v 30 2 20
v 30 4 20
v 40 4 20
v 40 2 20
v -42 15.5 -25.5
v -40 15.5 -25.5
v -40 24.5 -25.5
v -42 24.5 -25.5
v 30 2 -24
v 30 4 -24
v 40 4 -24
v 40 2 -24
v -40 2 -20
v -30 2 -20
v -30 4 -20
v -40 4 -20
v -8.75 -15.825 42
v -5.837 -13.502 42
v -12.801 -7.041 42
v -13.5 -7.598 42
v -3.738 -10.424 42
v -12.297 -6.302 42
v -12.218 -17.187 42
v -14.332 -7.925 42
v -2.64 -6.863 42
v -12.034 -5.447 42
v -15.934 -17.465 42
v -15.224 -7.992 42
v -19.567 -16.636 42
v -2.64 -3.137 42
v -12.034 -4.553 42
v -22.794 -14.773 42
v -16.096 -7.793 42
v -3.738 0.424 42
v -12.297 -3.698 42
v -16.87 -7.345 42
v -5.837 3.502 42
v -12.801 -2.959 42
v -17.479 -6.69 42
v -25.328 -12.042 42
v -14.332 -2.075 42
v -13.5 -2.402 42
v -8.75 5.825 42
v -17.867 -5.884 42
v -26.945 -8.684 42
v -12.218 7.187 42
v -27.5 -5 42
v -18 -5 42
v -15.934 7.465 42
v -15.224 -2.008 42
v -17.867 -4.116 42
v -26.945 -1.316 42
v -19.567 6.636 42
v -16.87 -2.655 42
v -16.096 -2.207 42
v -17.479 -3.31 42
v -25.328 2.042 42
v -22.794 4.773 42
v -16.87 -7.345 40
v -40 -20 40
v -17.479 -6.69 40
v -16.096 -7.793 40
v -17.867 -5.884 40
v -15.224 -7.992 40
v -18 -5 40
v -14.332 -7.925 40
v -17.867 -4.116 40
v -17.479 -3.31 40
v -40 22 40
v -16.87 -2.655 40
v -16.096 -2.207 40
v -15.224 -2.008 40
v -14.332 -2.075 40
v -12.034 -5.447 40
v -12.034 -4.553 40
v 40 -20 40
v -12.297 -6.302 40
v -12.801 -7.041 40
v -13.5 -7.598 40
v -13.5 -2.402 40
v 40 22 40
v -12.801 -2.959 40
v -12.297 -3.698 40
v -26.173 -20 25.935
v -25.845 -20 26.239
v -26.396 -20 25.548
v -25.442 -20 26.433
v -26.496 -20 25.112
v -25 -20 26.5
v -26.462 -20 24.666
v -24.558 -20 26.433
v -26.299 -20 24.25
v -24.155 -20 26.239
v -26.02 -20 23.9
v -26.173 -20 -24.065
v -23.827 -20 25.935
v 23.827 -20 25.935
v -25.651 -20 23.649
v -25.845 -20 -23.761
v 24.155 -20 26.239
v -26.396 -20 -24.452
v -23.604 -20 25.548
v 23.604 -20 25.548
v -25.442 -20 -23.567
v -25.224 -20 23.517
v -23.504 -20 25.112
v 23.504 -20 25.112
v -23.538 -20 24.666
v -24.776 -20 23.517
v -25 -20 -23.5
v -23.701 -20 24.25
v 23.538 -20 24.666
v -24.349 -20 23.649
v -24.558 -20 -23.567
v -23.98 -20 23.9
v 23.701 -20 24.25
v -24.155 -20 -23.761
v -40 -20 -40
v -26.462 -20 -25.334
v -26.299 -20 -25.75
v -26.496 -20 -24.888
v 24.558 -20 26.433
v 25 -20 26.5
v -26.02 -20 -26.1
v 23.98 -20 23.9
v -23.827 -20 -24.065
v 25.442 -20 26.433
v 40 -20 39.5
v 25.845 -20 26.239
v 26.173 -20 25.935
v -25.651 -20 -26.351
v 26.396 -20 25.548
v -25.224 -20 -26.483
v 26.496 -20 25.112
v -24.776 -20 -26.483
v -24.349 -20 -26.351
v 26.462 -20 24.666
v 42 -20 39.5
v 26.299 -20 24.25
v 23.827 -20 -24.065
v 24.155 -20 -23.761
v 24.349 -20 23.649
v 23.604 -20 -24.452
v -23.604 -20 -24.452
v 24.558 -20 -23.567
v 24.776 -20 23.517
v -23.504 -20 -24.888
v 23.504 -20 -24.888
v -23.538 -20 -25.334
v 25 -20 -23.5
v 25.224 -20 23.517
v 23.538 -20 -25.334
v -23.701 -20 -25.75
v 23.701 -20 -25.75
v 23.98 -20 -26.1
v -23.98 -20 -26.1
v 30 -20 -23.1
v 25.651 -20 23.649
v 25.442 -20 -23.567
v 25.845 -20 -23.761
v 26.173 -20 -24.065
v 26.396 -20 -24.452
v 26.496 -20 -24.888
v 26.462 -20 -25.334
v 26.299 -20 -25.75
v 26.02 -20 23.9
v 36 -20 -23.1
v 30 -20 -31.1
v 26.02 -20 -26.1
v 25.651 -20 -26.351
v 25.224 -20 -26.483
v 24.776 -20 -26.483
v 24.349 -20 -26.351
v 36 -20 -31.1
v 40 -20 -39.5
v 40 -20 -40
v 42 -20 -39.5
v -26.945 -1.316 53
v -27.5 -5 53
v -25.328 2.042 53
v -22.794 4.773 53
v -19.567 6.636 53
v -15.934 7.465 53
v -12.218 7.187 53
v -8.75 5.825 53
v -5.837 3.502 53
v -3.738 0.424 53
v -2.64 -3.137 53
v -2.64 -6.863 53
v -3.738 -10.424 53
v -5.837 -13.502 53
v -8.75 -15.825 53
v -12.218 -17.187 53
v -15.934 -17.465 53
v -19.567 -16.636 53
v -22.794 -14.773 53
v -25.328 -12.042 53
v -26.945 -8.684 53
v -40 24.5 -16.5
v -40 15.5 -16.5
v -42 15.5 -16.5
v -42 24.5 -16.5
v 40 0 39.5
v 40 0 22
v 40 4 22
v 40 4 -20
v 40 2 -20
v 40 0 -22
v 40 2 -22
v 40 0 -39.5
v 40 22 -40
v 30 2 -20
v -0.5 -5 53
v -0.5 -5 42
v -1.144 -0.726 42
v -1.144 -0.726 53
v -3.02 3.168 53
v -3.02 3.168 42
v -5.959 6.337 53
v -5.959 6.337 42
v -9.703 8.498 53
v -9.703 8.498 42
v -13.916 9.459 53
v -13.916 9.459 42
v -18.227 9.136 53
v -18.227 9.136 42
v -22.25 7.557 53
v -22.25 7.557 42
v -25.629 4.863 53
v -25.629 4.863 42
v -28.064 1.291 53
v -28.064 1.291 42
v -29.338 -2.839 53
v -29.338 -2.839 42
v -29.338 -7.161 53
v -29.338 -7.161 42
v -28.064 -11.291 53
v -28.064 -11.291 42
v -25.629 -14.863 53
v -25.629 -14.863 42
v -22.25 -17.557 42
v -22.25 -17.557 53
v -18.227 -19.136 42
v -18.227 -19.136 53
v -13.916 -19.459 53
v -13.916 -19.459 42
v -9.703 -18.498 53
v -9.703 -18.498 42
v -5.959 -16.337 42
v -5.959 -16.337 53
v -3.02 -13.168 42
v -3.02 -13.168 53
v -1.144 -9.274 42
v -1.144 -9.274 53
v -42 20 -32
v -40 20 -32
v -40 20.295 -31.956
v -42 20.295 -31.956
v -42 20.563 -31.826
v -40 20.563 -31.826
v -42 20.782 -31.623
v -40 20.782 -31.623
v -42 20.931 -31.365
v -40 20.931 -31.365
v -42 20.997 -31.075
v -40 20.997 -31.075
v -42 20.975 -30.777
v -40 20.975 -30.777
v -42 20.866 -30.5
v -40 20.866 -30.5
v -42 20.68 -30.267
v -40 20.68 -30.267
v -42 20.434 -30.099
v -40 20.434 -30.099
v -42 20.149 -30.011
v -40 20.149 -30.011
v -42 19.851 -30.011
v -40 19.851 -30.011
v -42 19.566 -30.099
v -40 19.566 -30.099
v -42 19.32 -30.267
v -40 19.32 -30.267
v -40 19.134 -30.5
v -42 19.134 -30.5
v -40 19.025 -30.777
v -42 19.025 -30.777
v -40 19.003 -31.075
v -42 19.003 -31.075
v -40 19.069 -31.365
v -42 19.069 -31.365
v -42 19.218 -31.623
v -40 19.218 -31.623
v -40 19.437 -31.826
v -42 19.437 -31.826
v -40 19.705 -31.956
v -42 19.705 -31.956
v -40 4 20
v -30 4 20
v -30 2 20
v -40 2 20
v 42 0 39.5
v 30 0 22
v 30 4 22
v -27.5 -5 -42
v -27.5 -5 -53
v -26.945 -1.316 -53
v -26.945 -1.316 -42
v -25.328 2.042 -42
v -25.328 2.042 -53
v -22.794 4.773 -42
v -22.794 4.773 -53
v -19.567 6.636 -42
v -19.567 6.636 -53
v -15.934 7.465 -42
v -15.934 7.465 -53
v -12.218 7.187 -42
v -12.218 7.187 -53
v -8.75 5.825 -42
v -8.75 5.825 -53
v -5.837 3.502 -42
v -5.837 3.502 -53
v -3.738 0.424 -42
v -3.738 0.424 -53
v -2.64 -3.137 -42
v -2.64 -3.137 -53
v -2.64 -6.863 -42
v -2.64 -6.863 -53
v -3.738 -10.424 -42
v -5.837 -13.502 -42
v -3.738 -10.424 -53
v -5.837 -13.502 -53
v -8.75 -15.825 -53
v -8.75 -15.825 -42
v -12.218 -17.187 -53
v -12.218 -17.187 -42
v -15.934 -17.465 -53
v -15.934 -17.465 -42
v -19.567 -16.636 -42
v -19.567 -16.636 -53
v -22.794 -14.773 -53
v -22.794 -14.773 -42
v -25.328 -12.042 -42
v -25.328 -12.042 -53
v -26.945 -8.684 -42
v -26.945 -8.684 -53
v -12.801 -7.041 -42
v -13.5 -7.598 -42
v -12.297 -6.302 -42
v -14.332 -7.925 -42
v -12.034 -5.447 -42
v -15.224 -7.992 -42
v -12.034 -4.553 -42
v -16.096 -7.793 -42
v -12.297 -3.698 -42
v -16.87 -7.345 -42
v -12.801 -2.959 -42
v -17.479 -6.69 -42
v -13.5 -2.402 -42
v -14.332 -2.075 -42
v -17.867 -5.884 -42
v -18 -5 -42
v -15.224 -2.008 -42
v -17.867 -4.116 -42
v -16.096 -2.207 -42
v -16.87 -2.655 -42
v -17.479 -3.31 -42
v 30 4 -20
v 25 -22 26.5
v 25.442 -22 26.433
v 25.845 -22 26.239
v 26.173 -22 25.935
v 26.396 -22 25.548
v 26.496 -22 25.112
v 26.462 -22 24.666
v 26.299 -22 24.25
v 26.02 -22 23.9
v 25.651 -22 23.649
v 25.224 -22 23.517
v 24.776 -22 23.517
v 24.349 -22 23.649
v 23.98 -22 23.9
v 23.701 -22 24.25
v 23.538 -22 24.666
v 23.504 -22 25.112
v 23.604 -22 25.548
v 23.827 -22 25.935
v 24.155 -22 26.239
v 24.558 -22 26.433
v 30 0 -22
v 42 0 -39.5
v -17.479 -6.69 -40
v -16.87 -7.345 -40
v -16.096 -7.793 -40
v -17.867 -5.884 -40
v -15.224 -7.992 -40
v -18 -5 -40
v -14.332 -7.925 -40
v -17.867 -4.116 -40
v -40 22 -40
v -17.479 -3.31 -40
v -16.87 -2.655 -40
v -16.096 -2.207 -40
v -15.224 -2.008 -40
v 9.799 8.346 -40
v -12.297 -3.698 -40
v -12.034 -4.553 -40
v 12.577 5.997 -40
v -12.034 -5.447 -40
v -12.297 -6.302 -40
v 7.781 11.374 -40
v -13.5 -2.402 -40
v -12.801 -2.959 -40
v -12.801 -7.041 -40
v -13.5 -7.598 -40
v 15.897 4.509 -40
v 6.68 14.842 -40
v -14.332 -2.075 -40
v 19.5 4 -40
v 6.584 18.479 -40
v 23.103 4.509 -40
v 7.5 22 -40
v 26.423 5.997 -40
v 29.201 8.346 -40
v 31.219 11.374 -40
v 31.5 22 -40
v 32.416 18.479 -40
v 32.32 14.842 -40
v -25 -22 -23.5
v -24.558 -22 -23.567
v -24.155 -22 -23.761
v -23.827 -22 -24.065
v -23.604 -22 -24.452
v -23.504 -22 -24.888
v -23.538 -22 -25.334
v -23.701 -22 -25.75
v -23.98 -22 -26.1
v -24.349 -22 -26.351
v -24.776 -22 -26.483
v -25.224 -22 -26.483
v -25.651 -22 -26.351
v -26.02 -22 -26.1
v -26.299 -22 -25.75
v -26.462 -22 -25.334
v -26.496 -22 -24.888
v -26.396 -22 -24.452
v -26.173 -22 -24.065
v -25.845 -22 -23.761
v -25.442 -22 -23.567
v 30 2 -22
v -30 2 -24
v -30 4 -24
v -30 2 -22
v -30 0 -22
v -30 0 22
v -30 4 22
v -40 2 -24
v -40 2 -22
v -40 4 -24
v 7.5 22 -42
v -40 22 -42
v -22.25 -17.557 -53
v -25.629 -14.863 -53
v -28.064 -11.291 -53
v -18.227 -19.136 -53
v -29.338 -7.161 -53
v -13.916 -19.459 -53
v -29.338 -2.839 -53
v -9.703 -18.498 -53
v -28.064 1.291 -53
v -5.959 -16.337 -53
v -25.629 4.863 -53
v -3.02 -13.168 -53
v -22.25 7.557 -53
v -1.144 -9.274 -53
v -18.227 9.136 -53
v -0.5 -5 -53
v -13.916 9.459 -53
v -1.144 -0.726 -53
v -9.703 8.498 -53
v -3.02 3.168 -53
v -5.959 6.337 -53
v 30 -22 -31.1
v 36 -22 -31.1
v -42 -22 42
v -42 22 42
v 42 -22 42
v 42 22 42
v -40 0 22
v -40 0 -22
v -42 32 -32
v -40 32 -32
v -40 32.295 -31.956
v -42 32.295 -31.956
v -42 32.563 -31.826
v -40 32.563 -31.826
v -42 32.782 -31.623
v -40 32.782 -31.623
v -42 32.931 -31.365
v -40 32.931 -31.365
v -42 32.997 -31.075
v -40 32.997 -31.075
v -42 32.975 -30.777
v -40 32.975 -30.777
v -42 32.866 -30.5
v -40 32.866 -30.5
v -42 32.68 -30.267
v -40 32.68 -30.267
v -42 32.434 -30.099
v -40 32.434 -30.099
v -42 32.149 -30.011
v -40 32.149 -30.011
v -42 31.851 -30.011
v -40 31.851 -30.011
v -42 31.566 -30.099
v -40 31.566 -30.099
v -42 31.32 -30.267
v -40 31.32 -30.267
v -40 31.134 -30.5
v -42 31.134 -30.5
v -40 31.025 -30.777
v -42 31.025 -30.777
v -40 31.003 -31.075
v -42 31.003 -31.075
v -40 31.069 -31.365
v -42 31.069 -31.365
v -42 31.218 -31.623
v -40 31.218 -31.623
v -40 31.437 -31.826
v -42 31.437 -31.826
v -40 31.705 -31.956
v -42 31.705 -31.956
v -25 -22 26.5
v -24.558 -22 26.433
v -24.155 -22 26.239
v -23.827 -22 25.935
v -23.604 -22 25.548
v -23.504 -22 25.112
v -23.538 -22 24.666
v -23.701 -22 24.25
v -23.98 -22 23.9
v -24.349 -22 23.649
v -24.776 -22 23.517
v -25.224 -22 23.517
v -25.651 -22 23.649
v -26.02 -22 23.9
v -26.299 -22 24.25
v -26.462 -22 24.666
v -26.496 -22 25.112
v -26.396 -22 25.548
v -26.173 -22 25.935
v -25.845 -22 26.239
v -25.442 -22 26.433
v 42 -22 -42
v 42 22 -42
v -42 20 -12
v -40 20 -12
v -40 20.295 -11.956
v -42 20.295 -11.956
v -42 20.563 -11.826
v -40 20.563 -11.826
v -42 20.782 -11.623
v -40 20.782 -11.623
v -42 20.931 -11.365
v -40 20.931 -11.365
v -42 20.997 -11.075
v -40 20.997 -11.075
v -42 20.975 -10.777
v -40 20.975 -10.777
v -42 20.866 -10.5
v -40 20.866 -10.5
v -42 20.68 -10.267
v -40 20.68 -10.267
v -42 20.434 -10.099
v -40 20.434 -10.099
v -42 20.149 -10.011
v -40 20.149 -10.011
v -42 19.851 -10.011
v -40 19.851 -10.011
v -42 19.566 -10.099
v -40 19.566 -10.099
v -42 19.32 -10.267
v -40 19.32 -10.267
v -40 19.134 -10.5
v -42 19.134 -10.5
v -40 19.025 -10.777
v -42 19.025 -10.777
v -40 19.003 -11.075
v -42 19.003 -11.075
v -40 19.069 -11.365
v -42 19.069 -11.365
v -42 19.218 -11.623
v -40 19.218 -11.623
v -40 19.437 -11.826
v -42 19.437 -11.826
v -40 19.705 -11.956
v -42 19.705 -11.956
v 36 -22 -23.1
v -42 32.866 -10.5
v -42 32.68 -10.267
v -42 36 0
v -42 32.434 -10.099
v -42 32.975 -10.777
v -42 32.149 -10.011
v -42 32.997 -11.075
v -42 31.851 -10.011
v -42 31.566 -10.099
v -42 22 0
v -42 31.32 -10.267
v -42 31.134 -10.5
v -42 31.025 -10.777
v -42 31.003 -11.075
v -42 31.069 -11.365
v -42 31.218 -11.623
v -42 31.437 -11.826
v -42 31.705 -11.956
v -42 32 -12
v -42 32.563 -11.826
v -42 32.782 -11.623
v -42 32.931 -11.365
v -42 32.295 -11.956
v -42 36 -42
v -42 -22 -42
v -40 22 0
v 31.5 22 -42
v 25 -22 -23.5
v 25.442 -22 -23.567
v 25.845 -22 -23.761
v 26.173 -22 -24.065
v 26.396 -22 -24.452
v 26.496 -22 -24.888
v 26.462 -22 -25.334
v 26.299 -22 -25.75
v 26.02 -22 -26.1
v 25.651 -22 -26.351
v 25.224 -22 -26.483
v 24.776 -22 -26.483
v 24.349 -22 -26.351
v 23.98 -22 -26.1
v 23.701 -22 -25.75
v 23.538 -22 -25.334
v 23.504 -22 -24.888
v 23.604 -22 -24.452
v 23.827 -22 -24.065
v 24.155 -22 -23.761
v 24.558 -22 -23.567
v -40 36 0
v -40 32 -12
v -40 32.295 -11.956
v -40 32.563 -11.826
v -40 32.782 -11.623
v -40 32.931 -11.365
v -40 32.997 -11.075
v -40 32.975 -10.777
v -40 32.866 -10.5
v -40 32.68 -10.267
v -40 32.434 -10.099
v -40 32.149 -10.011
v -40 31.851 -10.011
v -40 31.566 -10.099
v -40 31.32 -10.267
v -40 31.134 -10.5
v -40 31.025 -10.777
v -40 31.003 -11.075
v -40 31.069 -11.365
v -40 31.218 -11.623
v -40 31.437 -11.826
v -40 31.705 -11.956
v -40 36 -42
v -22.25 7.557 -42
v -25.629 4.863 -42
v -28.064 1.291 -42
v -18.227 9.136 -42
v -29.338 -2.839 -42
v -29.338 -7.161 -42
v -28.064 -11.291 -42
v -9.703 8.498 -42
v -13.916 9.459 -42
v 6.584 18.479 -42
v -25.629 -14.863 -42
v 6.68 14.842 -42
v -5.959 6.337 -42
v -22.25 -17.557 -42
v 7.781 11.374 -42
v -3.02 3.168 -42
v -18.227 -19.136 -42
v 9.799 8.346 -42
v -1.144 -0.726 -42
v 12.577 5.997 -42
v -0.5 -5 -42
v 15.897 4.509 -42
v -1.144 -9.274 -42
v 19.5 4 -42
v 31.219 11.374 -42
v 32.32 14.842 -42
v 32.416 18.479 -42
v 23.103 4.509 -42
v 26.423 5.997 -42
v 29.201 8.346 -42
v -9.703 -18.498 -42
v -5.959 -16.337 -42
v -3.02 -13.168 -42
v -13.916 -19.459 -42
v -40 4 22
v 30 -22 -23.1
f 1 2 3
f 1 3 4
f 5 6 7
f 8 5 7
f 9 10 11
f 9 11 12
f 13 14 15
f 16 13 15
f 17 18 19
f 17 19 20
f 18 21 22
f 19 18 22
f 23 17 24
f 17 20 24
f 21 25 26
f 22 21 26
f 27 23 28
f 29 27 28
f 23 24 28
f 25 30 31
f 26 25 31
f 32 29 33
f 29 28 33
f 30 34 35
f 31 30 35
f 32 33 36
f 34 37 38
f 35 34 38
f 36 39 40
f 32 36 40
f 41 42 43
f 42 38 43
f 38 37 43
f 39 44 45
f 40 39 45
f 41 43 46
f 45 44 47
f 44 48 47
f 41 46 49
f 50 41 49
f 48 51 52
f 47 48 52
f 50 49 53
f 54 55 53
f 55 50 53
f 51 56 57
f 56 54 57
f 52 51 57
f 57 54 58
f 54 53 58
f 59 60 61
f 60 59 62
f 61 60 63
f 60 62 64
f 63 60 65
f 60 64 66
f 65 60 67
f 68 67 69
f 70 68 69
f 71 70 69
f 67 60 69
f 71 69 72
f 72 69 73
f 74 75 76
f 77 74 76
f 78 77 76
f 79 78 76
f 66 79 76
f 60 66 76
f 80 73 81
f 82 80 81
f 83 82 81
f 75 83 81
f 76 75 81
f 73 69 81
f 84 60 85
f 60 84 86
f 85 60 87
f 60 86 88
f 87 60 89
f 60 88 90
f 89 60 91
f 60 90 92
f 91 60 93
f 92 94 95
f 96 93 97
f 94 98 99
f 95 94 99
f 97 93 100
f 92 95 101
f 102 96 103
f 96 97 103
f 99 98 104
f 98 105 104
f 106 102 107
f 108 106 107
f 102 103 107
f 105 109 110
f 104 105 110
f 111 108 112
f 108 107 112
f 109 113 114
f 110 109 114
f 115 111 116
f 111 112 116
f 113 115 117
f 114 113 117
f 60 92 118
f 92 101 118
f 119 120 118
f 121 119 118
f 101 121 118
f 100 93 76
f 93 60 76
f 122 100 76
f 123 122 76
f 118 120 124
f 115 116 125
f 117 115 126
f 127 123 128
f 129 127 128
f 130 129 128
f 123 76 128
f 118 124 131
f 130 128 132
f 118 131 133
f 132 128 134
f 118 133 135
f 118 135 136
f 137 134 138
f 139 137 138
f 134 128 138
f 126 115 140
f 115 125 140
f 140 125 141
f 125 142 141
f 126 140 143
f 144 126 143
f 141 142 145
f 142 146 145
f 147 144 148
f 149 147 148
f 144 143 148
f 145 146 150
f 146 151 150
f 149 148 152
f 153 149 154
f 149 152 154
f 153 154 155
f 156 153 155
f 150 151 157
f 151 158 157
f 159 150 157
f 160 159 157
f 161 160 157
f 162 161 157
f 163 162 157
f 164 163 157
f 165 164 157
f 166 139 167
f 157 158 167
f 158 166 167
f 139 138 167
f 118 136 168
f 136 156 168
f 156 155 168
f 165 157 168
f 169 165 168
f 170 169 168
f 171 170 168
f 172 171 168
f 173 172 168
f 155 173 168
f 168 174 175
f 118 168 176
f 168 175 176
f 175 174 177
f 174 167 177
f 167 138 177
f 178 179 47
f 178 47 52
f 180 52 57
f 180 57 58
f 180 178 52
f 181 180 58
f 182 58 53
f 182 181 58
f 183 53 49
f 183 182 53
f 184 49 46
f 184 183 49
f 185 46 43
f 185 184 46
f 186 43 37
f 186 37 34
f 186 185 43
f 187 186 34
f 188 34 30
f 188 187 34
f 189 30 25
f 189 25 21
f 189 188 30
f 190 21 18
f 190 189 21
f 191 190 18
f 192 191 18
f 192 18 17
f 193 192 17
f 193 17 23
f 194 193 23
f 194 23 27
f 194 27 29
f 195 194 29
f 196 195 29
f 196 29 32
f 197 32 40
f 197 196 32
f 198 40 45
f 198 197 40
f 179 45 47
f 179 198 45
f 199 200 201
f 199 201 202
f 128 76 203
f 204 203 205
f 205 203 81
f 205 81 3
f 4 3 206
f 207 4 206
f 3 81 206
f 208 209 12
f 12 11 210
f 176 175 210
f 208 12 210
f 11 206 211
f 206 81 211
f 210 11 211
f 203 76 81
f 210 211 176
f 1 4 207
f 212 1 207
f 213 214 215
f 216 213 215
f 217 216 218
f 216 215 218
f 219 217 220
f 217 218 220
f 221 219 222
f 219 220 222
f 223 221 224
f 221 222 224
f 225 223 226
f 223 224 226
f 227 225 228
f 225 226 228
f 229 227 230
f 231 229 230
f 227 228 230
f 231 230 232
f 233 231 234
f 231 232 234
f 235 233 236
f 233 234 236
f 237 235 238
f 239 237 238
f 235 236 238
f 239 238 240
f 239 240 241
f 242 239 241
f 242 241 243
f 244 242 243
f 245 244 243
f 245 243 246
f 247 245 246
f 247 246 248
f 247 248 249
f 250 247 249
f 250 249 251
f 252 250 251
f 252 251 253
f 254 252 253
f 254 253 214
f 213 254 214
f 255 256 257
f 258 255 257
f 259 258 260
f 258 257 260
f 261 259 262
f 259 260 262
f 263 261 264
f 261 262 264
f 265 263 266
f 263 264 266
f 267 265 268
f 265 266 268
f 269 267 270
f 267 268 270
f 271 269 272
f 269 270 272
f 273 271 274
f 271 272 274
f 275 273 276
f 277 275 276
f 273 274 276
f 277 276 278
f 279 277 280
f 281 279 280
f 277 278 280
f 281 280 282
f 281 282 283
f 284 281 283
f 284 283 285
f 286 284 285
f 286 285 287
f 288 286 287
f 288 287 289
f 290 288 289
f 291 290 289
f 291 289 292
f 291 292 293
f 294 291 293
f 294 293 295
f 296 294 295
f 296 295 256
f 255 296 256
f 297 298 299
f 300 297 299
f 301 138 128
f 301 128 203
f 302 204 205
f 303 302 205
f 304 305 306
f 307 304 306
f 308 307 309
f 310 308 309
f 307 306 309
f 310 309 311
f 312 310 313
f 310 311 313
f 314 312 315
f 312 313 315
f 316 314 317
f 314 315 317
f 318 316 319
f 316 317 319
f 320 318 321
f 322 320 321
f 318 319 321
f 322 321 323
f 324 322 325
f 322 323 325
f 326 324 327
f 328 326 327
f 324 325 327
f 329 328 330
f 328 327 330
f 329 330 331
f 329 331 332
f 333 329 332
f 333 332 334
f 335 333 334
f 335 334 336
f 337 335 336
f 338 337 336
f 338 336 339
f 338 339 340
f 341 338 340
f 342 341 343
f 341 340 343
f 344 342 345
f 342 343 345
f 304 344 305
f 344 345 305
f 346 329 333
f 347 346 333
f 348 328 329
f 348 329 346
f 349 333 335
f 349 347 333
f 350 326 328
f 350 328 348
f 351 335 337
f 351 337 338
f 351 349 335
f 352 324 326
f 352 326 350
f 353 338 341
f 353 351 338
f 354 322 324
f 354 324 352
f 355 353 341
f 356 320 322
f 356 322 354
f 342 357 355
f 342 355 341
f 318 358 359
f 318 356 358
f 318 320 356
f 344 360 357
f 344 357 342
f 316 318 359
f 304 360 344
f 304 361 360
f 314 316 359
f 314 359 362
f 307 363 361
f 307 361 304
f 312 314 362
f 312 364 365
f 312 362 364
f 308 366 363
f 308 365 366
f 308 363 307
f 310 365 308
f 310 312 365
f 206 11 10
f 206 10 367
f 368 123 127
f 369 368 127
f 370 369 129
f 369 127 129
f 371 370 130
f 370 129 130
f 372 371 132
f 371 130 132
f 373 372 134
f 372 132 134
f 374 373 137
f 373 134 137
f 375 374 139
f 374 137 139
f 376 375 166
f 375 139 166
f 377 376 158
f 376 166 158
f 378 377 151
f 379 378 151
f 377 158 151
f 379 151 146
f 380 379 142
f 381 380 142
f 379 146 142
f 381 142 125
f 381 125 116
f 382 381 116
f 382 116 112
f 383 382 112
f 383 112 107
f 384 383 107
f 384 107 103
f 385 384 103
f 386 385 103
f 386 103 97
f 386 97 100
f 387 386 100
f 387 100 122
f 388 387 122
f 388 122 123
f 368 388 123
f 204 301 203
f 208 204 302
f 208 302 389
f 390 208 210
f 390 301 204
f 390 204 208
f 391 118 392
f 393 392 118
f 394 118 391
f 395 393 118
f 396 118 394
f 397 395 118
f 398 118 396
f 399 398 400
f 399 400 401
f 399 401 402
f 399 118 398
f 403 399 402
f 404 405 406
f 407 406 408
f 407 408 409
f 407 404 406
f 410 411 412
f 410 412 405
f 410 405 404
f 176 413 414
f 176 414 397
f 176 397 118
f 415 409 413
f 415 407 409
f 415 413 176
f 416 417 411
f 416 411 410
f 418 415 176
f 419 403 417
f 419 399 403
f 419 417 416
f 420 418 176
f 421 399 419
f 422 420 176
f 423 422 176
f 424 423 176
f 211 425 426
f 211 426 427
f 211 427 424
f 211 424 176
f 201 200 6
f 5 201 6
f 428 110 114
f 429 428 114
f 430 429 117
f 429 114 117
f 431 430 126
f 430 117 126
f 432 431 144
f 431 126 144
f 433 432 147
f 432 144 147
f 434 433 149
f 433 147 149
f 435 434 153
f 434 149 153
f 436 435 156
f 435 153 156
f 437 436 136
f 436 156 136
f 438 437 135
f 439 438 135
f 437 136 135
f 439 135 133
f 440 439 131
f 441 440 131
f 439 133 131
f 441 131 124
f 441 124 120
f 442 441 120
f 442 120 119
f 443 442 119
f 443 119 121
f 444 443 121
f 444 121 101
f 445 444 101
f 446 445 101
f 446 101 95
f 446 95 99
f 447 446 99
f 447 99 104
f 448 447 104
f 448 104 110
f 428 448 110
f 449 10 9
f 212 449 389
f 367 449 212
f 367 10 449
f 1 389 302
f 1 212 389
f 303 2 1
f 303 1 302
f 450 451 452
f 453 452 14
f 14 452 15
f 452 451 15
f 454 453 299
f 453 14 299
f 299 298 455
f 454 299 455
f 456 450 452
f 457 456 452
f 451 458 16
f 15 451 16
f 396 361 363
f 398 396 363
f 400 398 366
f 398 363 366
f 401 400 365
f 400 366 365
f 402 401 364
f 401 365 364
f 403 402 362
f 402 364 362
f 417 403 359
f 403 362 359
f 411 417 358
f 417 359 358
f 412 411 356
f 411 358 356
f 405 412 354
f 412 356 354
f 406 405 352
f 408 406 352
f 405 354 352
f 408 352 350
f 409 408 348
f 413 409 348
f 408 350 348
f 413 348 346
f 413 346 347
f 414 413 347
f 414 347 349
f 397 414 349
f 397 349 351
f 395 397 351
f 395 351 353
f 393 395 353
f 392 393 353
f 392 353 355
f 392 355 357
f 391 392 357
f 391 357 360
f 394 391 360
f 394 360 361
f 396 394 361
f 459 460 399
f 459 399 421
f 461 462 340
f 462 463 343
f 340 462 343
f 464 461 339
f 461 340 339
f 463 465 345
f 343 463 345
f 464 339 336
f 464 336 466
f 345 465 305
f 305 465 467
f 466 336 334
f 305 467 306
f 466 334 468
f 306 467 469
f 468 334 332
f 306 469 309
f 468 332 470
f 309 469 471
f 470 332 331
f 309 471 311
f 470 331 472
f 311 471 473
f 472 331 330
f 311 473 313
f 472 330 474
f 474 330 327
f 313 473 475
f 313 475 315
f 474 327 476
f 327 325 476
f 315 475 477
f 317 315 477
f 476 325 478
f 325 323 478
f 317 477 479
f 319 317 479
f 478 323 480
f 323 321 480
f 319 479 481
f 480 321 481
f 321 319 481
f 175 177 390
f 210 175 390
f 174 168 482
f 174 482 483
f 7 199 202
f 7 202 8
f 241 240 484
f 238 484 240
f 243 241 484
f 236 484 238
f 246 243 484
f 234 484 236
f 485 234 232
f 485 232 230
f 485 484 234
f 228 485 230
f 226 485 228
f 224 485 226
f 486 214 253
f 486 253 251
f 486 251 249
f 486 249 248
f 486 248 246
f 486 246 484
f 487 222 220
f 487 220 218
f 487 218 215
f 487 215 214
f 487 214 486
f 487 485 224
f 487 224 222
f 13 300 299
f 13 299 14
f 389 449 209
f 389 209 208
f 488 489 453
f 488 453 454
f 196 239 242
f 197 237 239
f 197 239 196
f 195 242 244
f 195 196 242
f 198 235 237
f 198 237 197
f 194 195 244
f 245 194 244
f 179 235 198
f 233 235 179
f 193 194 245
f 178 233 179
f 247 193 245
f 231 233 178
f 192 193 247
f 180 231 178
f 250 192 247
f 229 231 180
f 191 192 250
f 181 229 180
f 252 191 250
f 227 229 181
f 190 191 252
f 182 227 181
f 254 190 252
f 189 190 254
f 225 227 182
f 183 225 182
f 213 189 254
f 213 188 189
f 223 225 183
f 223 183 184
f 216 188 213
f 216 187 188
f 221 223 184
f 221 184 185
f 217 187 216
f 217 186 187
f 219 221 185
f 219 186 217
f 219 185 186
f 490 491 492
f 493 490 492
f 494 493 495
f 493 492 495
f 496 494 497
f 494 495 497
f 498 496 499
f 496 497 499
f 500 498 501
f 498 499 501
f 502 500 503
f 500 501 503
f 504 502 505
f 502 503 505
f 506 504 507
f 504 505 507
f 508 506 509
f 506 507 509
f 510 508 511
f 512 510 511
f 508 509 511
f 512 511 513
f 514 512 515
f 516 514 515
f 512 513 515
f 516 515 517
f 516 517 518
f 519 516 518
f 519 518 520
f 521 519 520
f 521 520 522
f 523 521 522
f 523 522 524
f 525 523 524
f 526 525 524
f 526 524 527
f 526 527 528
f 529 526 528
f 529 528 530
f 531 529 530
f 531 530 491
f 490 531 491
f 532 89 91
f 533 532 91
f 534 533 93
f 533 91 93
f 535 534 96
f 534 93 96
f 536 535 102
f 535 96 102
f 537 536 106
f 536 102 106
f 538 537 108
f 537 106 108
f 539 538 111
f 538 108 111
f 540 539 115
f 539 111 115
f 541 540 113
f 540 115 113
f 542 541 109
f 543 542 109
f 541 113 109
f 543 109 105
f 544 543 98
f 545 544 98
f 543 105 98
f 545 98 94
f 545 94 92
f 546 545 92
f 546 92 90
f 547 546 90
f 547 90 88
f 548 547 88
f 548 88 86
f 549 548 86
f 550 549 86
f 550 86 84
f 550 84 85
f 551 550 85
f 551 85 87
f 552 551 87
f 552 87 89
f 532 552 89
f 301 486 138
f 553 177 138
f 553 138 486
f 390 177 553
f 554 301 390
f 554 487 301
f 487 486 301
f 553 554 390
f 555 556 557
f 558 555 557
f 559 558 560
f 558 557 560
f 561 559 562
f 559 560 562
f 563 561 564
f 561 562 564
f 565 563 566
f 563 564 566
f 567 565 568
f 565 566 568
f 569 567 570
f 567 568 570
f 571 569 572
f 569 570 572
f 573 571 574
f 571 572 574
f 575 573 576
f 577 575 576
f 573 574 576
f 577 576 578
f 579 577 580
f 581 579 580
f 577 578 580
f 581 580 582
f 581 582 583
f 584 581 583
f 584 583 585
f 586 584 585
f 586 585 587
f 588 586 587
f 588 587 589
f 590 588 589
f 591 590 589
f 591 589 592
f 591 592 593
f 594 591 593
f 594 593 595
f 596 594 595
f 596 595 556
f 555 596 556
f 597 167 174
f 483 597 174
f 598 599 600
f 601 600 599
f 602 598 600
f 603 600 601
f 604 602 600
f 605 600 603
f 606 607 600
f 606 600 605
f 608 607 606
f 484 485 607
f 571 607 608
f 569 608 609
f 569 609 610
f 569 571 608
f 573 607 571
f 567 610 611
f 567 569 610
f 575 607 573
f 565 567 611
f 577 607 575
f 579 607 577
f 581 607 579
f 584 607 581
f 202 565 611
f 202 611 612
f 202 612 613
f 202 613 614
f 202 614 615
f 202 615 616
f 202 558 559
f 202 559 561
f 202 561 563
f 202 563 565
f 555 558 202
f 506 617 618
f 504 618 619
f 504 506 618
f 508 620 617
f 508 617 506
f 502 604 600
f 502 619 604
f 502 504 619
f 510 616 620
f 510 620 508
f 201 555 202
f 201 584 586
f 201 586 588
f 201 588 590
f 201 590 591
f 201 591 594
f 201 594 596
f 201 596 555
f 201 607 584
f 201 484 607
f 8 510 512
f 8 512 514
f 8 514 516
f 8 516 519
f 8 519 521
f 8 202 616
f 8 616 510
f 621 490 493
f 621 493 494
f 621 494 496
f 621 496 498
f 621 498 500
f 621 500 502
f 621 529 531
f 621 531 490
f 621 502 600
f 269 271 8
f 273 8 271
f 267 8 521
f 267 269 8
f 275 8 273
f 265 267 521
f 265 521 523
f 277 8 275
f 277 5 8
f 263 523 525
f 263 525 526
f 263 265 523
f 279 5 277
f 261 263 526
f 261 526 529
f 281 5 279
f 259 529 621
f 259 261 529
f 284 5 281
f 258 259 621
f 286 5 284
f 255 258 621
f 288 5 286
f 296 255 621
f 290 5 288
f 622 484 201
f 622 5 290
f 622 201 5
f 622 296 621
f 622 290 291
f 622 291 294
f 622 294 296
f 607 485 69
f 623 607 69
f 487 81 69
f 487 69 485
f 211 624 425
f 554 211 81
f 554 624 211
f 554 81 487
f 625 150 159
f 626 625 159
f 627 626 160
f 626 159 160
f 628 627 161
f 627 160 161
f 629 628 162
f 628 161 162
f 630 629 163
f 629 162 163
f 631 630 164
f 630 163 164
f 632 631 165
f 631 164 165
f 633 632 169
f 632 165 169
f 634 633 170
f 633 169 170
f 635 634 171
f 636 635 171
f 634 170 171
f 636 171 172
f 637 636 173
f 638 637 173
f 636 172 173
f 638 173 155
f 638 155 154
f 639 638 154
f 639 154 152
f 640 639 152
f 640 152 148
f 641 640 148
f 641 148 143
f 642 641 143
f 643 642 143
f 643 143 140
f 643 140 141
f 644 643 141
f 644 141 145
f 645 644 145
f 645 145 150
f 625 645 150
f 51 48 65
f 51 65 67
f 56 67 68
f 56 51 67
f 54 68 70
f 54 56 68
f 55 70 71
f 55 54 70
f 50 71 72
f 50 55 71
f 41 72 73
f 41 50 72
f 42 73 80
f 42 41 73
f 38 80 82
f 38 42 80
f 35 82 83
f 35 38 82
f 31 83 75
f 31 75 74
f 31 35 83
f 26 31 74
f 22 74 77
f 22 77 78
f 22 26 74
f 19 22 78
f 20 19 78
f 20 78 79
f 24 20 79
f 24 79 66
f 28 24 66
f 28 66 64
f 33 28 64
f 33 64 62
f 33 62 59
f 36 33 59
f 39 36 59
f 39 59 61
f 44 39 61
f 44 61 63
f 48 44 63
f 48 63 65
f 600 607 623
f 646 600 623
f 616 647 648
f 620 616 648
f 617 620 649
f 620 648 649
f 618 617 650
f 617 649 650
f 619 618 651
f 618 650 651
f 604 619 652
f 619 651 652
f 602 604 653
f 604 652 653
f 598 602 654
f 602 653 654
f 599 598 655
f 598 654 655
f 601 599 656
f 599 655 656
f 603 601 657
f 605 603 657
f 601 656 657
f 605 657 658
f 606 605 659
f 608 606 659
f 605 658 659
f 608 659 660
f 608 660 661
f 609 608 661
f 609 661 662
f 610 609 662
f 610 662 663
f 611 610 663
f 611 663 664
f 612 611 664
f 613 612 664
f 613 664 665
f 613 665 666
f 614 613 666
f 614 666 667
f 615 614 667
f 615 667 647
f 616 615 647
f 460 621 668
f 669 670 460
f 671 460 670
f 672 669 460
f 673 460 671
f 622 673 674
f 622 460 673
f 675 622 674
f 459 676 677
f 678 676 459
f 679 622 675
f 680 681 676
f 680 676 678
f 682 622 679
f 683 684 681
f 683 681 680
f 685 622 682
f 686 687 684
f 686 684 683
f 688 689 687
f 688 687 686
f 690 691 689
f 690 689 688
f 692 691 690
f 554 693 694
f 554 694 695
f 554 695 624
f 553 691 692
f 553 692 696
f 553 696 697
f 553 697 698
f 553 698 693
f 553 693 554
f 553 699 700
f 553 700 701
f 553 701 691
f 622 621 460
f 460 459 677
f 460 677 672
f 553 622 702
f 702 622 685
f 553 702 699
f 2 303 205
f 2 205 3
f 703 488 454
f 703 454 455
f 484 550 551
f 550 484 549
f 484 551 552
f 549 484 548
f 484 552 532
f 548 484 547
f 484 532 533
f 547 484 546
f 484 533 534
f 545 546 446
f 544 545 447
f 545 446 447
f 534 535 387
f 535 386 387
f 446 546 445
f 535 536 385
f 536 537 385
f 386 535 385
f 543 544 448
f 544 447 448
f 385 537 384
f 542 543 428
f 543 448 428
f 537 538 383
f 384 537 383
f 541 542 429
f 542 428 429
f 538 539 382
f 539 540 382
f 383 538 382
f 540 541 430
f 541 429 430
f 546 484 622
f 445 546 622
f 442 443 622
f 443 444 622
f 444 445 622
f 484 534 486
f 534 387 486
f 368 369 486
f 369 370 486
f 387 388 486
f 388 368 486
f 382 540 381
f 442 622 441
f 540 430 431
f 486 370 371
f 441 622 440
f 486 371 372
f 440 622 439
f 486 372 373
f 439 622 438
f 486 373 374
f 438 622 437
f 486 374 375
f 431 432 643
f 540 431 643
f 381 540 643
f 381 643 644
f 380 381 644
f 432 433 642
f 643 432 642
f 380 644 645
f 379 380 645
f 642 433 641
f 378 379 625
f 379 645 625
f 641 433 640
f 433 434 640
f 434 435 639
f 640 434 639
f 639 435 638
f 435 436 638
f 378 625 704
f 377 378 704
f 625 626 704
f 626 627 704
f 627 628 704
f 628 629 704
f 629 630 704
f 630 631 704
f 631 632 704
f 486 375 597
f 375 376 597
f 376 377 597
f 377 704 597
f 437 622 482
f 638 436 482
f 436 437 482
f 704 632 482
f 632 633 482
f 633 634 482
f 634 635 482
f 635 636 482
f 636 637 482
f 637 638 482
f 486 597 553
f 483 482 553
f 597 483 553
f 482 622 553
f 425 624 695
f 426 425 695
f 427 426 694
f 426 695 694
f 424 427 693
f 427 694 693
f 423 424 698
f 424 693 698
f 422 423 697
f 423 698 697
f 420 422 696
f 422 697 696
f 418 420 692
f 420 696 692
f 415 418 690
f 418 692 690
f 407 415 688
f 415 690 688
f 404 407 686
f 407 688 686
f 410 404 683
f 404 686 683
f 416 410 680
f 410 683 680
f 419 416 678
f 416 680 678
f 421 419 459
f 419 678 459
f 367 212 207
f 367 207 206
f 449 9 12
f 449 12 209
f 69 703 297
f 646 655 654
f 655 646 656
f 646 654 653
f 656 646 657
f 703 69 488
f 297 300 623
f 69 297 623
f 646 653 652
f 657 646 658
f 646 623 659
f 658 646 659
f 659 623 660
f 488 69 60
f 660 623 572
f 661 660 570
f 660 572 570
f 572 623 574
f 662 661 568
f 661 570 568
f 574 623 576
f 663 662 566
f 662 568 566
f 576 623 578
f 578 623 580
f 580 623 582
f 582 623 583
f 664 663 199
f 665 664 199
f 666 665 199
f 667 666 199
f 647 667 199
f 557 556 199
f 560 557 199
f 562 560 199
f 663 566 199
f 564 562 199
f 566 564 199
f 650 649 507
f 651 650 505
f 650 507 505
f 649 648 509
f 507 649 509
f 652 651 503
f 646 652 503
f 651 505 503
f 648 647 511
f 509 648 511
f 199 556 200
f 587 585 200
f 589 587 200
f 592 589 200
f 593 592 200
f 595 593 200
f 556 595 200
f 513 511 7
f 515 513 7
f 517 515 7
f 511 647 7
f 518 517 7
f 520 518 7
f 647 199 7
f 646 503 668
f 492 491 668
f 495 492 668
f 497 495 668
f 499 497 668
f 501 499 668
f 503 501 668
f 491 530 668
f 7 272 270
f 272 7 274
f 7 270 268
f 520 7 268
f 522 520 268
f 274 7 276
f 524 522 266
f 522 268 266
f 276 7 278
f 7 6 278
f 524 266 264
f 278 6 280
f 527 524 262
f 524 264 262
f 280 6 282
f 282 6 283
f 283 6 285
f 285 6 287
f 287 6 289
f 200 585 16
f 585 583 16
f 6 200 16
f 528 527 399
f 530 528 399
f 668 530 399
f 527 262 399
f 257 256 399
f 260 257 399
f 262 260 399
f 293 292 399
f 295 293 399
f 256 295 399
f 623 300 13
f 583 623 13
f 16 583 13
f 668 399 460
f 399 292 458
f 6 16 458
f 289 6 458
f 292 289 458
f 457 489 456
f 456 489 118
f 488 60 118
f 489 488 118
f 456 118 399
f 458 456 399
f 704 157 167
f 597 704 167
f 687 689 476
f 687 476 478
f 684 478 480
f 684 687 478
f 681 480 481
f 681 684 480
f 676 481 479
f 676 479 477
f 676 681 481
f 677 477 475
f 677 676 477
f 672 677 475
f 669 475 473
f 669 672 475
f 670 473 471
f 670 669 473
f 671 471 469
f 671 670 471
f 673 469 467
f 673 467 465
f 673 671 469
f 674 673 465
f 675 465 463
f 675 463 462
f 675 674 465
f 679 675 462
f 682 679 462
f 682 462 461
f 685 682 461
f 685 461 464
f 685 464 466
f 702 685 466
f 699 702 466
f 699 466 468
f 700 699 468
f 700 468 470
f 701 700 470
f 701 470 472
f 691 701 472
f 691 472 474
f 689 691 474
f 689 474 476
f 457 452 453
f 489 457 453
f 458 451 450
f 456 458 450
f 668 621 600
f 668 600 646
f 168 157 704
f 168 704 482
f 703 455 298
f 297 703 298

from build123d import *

# Parameters (mm, degrees)
SKETCH1_W           = 84
SKETCH1_H           = 84
BOSS_EXTRUDE1_DEPTH = 22
SKETCH2_W           = 80
SKETCH2_H           = 80
CUT_EXTRUDE1_DEPTH  = 42
SKETCH3_W           = 6
SKETCH3_H           = 8
CUT_EXTRUDE2_DEPTH  = 73.746133918
CUT_EXTRUDE3_REACH  = 98.457
SKETCH5_W           = 79
SKETCH5_H           = 20
BOSS_EXTRUDE2_DEPTH = 10
CUT_EXTRUDE4_REACH  = 98.457
SKETCH6_R           = 13
SKETCH8_W           = 2
SKETCH8_H           = 42
BOSS_EXTRUDE3_DEPTH = 14
CUT_EXTRUDE6_REACH  = 100.914
SKETCH7_R           = 1
SKETCH7_W           = 9
SKETCH7_H           = 9
SKETCH9_R           = 1.5
CUT_EXTRUDE7_DEPTH  = 82.633326528
SKETCH14_R          = 14.5
BOSS_EXTRUDE4_DEPTH = 13
SKETCH15_R          = 12.5
CUT_EXTRUDE8_DEPTH  = 11
CUT_EXTRUDE9_REACH  = 102.578
SKETCH16_R          = 3


with BuildPart() as part:
    # Sketch1 → Boss-Extrude1 (new, symmetric)
    with BuildSketch(Plane(origin=(0, 0, 0), x_dir=(1, 0, 0), z_dir=(0, 1, 0))):
        Rectangle(SKETCH1_W, SKETCH1_H)
    extrude(amount=BOSS_EXTRUDE1_DEPTH, both=True)

    # Sketch2 → Cut-Extrude1 (cut)
    with BuildSketch(Plane(origin=(0, 22, 0), x_dir=(1, 0, 0), z_dir=(0, 1, 0))):
        Rectangle(SKETCH2_W, SKETCH2_H)
    extrude(amount=-CUT_EXTRUDE1_DEPTH, mode=Mode.SUBTRACT)

    # Sketch3 → Cut-Extrude2 (cut, through all)
    with BuildSketch(Plane(origin=(0, -20, 0), x_dir=(1, 0, 0), z_dir=(0, 1, 0))):
        with Locations((33, 27.1)):
            Rectangle(SKETCH3_W, SKETCH3_H)
    extrude(amount=-CUT_EXTRUDE2_DEPTH, mode=Mode.SUBTRACT)

    # Sketch5 → Cut-Extrude3 (cut, up to next)
    with BuildSketch(Plane(origin=(42, 0, 0), x_dir=(0, 0, -1), z_dir=(1, 0, 0)), mode=Mode.PRIVATE) as cut_extrude3_sk1:
        with Locations((0, -10)):
            Rectangle(SKETCH5_W, SKETCH5_H)
    cut_extrude3_tool1 = extrude(cut_extrude3_sk1.sketch, amount=-CUT_EXTRUDE3_REACH, mode=Mode.PRIVATE) & part.part
    add(cut_extrude3_tool1.solids().sort_by_distance((42, -10, 0))[0], mode=Mode.SUBTRACT)

    # Sketch4 → Boss-Extrude2 (add)
    with BuildSketch(Plane(origin=(-40, 0, 0), x_dir=(0, 0, -1), z_dir=(1, 0, 0))):
        Polygon((-22, 4), (-20, 4), (-20, 2), (20, 2), (20, 4), (22, 4), (24, 4), (24, 2), (22, 2), (22, 0), (-22, 0), align=None)
    boss_extrude2 = extrude(amount=BOSS_EXTRUDE2_DEPTH)

    # Mirror1: Boss-Extrude2 across plane
    add(boss_extrude2.mirror(Plane(origin=(0, 0, 0), x_dir=(0, 0, 1), z_dir=(1, 0, 0))))

    # Sketch6 → Cut-Extrude4 (cut, up to next)
    with BuildSketch(Plane(origin=(0, 0, -42), x_dir=(-1, 0, 0), z_dir=(0, 0, -1)), mode=Mode.PRIVATE) as cut_extrude4_sk1:
        with Locations((-19.5, 17)):
            Circle(SKETCH6_R)
    cut_extrude4_tool1 = extrude(cut_extrude4_sk1.sketch, amount=-CUT_EXTRUDE4_REACH, mode=Mode.PRIVATE) & part.part
    add(cut_extrude4_tool1.solids().sort_by_distance((19.5, 17, -42))[0], mode=Mode.SUBTRACT)

    # Sketch8 → Boss-Extrude3 (add)
    with BuildSketch(Plane(origin=(0, 22, 0), x_dir=(1, 0, 0), z_dir=(0, 1, 0))):
        with Locations((-41, 21)):
            Rectangle(SKETCH8_W, SKETCH8_H)
    extrude(amount=BOSS_EXTRUDE3_DEPTH)

    # Sketch7 → Cut-Extrude6 (cut, up to next)
    with BuildSketch(Plane(origin=(-40, 0, 0), x_dir=(0, 0, -1), z_dir=(1, 0, 0)), mode=Mode.PRIVATE) as cut_extrude6_sk1:
        with Locations((31, 32)):
            Circle(SKETCH7_R)
    cut_extrude6_tool1 = extrude(cut_extrude6_sk1.sketch, amount=-CUT_EXTRUDE6_REACH, mode=Mode.PRIVATE) & part.part
    # Sketch7 → Cut-Extrude6 (cut, up to next)
    with BuildSketch(Plane(origin=(-40, 0, 0), x_dir=(0, 0, -1), z_dir=(1, 0, 0)), mode=Mode.PRIVATE) as cut_extrude6_sk2:
        with Locations((31, 20)):
            Circle(SKETCH7_R)
    cut_extrude6_tool2 = extrude(cut_extrude6_sk2.sketch, amount=-CUT_EXTRUDE6_REACH, mode=Mode.PRIVATE) & part.part
    # Sketch7 → Cut-Extrude6 (cut, up to next)
    with BuildSketch(Plane(origin=(-40, 0, 0), x_dir=(0, 0, -1), z_dir=(1, 0, 0)), mode=Mode.PRIVATE) as cut_extrude6_sk3:
        with Locations((11, 20)):
            Circle(SKETCH7_R)
    cut_extrude6_tool3 = extrude(cut_extrude6_sk3.sketch, amount=-CUT_EXTRUDE6_REACH, mode=Mode.PRIVATE) & part.part
    # Sketch7 → Cut-Extrude6 (cut, up to next)
    with BuildSketch(Plane(origin=(-40, 0, 0), x_dir=(0, 0, -1), z_dir=(1, 0, 0)), mode=Mode.PRIVATE) as cut_extrude6_sk4:
        with Locations((11, 32)):
            Circle(SKETCH7_R)
    cut_extrude6_tool4 = extrude(cut_extrude6_sk4.sketch, amount=-CUT_EXTRUDE6_REACH, mode=Mode.PRIVATE) & part.part
    # Sketch7 → Cut-Extrude6 (cut, up to next)
    with BuildSketch(Plane(origin=(-40, 0, 0), x_dir=(0, 0, -1), z_dir=(1, 0, 0)), mode=Mode.PRIVATE) as cut_extrude6_sk5:
        with Locations((21, 20)):
            Rectangle(SKETCH7_W, SKETCH7_H)
    cut_extrude6_tool5 = extrude(cut_extrude6_sk5.sketch, amount=-CUT_EXTRUDE6_REACH, mode=Mode.PRIVATE) & part.part
    add(cut_extrude6_tool1.solids().sort_by_distance((-40, 32, -31))[0], mode=Mode.SUBTRACT)
    add(cut_extrude6_tool2.solids().sort_by_distance((-40, 20, -31))[0], mode=Mode.SUBTRACT)
    add(cut_extrude6_tool3.solids().sort_by_distance((-40, 20, -11))[0], mode=Mode.SUBTRACT)
    add(cut_extrude6_tool4.solids().sort_by_distance((-40, 32, -11))[0], mode=Mode.SUBTRACT)
    add(cut_extrude6_tool5.solids().sort_by_distance((-40, 20, -21))[0], mode=Mode.SUBTRACT)

    # Sketch9 → Cut-Extrude7 (cut, through all)
    with BuildSketch(Plane(origin=(0, -20, 0), x_dir=(1, 0, 0), z_dir=(0, 1, 0))):
        with Locations(Location((-25, 25, 0), (0, 0, 270))):
            Circle(SKETCH9_R)
        with Locations(Location((25, 25, 0), (0, 0, 270))):
            Circle(SKETCH9_R)
        with Locations(Location((25, -25, 0), (0, 0, 270))):
            Circle(SKETCH9_R)
        with Locations(Location((-25, -25, 0), (0, 0, 270))):
            Circle(SKETCH9_R)
    extrude(amount=-CUT_EXTRUDE7_DEPTH, mode=Mode.SUBTRACT)

    # Sketch14 → Boss-Extrude4 (add)
    with BuildSketch(Plane.XY.offset(-40)):
        with Locations((-15, -5)):
            Circle(SKETCH14_R)
    boss_extrude4 = extrude(amount=-BOSS_EXTRUDE4_DEPTH)

    # Sketch15 → Cut-Extrude8 (cut)
    with BuildSketch(Plane(origin=(0, 0, -53), x_dir=(-1, 0, 0), z_dir=(0, 0, -1))):
        with Locations((15, -5)):
            Circle(SKETCH15_R)
    cut_extrude8 = extrude(amount=-CUT_EXTRUDE8_DEPTH, mode=Mode.SUBTRACT)

    # Sketch16 → Cut-Extrude9 (cut, up to next)
    with BuildSketch(Plane(origin=(0, 0, -42), x_dir=(-1, 0, 0), z_dir=(0, 0, -1)), mode=Mode.PRIVATE) as cut_extrude9_sk1:
        with Locations((15, -5)):
            Circle(SKETCH16_R)
    cut_extrude9_tool1 = extrude(cut_extrude9_sk1.sketch, amount=-CUT_EXTRUDE9_REACH, mode=Mode.PRIVATE) & part.part
    cut_extrude9 = cut_extrude9_tool1.solids().sort_by_distance((-15, -5, -42))[0]
    add(cut_extrude9, mode=Mode.SUBTRACT)

    # Mirror2: Boss-Extrude4, Cut-Extrude8, Cut-Extrude9 across plane
    add(boss_extrude4.mirror(Plane.XY))
    add(cut_extrude8.mirror(Plane.XY), mode=Mode.SUBTRACT)
    add(cut_extrude9.mirror(Plane.XY), mode=Mode.SUBTRACT)


solid = part.part
